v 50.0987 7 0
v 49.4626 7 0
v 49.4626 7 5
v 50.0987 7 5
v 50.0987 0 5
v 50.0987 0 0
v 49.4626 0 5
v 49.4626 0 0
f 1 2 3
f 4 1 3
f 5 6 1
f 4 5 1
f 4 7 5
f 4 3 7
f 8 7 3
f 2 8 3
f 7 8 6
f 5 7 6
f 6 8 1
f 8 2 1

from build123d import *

# Parameters (mm, degrees)
BOSS_EXTRU_1_DEPTH               = 5
ENL_V_MAT_EXTRU_2_DEPTH          = 30
R_P_TITION_START                 = -13.698729417
R_P_TITION_LIN_AIRE1_OUTLINE_W   = 17
R_P_TITION_LIN_AIRE1_OUTLINE_H   = 5
R_P_TITION_LIN_AIRE1_DEPTH       = 167.693647085
R_P_TITION_START_2               = 86.498729417
R_P_TITION_LIN_AIRE1_2_OUTLINE_W = 7
R_P_TITION_LIN_AIRE1_2_OUTLINE_H = 5
R_P_TITION_LIN_AIRE1_2_DEPTH     = 67.496188251
R_P_TITION_LIN_AIRE1_3_OUTLINE_W = 7
R_P_TITION_LIN_AIRE1_3_OUTLINE_H = 5
R_P_TITION_LIN_AIRE1_3_DEPTH     = 63.161305733


# Read off the part's stored shape, not the designer's step: Répétition linéaire1
with BuildPart() as part:
    # Esquisse1 → Boss.-Extru.1 (new body)
    with BuildSketch(Plane.XY):
        with BuildLine():
            Line((-13.698729417, 0), (0, 0))
            Line((0, 0), (0, 19))
            Line((0, 19), (36.4, 19))
            Line((36.4, 19), (36.4, 0))
            Line((36.4, 0), (50.098729417, 0))
            Line((50.098729417, 0), (50.098729417, 19))
            Line((50.098729417, 19), (86.498729417, 19))
            Line((86.498729417, 19), (86.498729417, 0))
            Line((86.498729417, 0), (103.896188251, 0))
            Line((103.896188251, 0), (103.896188251, 19))
            Line((103.896188251, 19), (140.296188251, 19))
            Line((140.296188251, 19), (140.296188251, 0))
            Line((140.296188251, 0), (153.994917668, 0))
            Line((153.994917668, 0), (153.994917668, 19))
            Line((153.994917668, 19), (153.994917668, 24))
            Line((153.994917668, 24), (-8.698729417, 24))
            ThreePointArc((-8.698729417, 24), (-12.234263323, 22.535533906), (-13.698729417, 19))
            Line((-13.698729417, 19), (-13.698729417, 0))
        make_face()
    extrude(amount=BOSS_EXTRU_1_DEPTH)

    # Esquisse3 → Enlèv. mat.-Extru.2 (cut)
    with BuildSketch(Plane.XY.offset(5)):
        Polygon((-3.537423684, 3.002605055), (-3.537423684, 7), (-2.537423684, 7), (-2.537423684, 9), (-3.537423684, 9), (-3.537423684, 18), (-6.537423684, 18), (-6.537423684, 9), (-7.537423684, 9), (-7.537423684, 7), (-6.537423684, 7), (-6.537423684, 3.002605055), (-6.537423684, 0), (-3.537423684, 0), align=None)
    extrude(amount=-ENL_V_MAT_EXTRU_2_DEPTH, mode=Mode.SUBTRACT)

    # Répétition linéaire1 outline → Répétition linéaire1 (cut)
    with BuildSketch(Plane.YZ.offset(R_P_TITION_START)):
        with Locations((15.5, 2.5)):
            Rectangle(R_P_TITION_LIN_AIRE1_OUTLINE_W, R_P_TITION_LIN_AIRE1_OUTLINE_H)
    extrude(amount=R_P_TITION_LIN_AIRE1_DEPTH, mode=Mode.SUBTRACT)

    # R_p_tition lin_aire1 2 outline → R_p_tition lin_aire1 2 (cut)
    with BuildSketch(Plane.YZ.offset(R_P_TITION_START_2)):
        with Locations((3.5, 2.5)):
            Rectangle(R_P_TITION_LIN_AIRE1_2_OUTLINE_W, R_P_TITION_LIN_AIRE1_2_OUTLINE_H)
    extrude(amount=R_P_TITION_LIN_AIRE1_2_DEPTH, mode=Mode.SUBTRACT)

    # R_p_tition lin_aire1 3 outline → R_p_tition lin_aire1 3 (cut)
    with BuildSketch(Plane.YZ.offset(R_P_TITION_START)):
        with Locations((3.5, 2.5)):
            Rectangle(R_P_TITION_LIN_AIRE1_3_OUTLINE_W, R_P_TITION_LIN_AIRE1_3_OUTLINE_H)
    extrude(amount=R_P_TITION_LIN_AIRE1_3_DEPTH, mode=Mode.SUBTRACT)


solid = part.part
